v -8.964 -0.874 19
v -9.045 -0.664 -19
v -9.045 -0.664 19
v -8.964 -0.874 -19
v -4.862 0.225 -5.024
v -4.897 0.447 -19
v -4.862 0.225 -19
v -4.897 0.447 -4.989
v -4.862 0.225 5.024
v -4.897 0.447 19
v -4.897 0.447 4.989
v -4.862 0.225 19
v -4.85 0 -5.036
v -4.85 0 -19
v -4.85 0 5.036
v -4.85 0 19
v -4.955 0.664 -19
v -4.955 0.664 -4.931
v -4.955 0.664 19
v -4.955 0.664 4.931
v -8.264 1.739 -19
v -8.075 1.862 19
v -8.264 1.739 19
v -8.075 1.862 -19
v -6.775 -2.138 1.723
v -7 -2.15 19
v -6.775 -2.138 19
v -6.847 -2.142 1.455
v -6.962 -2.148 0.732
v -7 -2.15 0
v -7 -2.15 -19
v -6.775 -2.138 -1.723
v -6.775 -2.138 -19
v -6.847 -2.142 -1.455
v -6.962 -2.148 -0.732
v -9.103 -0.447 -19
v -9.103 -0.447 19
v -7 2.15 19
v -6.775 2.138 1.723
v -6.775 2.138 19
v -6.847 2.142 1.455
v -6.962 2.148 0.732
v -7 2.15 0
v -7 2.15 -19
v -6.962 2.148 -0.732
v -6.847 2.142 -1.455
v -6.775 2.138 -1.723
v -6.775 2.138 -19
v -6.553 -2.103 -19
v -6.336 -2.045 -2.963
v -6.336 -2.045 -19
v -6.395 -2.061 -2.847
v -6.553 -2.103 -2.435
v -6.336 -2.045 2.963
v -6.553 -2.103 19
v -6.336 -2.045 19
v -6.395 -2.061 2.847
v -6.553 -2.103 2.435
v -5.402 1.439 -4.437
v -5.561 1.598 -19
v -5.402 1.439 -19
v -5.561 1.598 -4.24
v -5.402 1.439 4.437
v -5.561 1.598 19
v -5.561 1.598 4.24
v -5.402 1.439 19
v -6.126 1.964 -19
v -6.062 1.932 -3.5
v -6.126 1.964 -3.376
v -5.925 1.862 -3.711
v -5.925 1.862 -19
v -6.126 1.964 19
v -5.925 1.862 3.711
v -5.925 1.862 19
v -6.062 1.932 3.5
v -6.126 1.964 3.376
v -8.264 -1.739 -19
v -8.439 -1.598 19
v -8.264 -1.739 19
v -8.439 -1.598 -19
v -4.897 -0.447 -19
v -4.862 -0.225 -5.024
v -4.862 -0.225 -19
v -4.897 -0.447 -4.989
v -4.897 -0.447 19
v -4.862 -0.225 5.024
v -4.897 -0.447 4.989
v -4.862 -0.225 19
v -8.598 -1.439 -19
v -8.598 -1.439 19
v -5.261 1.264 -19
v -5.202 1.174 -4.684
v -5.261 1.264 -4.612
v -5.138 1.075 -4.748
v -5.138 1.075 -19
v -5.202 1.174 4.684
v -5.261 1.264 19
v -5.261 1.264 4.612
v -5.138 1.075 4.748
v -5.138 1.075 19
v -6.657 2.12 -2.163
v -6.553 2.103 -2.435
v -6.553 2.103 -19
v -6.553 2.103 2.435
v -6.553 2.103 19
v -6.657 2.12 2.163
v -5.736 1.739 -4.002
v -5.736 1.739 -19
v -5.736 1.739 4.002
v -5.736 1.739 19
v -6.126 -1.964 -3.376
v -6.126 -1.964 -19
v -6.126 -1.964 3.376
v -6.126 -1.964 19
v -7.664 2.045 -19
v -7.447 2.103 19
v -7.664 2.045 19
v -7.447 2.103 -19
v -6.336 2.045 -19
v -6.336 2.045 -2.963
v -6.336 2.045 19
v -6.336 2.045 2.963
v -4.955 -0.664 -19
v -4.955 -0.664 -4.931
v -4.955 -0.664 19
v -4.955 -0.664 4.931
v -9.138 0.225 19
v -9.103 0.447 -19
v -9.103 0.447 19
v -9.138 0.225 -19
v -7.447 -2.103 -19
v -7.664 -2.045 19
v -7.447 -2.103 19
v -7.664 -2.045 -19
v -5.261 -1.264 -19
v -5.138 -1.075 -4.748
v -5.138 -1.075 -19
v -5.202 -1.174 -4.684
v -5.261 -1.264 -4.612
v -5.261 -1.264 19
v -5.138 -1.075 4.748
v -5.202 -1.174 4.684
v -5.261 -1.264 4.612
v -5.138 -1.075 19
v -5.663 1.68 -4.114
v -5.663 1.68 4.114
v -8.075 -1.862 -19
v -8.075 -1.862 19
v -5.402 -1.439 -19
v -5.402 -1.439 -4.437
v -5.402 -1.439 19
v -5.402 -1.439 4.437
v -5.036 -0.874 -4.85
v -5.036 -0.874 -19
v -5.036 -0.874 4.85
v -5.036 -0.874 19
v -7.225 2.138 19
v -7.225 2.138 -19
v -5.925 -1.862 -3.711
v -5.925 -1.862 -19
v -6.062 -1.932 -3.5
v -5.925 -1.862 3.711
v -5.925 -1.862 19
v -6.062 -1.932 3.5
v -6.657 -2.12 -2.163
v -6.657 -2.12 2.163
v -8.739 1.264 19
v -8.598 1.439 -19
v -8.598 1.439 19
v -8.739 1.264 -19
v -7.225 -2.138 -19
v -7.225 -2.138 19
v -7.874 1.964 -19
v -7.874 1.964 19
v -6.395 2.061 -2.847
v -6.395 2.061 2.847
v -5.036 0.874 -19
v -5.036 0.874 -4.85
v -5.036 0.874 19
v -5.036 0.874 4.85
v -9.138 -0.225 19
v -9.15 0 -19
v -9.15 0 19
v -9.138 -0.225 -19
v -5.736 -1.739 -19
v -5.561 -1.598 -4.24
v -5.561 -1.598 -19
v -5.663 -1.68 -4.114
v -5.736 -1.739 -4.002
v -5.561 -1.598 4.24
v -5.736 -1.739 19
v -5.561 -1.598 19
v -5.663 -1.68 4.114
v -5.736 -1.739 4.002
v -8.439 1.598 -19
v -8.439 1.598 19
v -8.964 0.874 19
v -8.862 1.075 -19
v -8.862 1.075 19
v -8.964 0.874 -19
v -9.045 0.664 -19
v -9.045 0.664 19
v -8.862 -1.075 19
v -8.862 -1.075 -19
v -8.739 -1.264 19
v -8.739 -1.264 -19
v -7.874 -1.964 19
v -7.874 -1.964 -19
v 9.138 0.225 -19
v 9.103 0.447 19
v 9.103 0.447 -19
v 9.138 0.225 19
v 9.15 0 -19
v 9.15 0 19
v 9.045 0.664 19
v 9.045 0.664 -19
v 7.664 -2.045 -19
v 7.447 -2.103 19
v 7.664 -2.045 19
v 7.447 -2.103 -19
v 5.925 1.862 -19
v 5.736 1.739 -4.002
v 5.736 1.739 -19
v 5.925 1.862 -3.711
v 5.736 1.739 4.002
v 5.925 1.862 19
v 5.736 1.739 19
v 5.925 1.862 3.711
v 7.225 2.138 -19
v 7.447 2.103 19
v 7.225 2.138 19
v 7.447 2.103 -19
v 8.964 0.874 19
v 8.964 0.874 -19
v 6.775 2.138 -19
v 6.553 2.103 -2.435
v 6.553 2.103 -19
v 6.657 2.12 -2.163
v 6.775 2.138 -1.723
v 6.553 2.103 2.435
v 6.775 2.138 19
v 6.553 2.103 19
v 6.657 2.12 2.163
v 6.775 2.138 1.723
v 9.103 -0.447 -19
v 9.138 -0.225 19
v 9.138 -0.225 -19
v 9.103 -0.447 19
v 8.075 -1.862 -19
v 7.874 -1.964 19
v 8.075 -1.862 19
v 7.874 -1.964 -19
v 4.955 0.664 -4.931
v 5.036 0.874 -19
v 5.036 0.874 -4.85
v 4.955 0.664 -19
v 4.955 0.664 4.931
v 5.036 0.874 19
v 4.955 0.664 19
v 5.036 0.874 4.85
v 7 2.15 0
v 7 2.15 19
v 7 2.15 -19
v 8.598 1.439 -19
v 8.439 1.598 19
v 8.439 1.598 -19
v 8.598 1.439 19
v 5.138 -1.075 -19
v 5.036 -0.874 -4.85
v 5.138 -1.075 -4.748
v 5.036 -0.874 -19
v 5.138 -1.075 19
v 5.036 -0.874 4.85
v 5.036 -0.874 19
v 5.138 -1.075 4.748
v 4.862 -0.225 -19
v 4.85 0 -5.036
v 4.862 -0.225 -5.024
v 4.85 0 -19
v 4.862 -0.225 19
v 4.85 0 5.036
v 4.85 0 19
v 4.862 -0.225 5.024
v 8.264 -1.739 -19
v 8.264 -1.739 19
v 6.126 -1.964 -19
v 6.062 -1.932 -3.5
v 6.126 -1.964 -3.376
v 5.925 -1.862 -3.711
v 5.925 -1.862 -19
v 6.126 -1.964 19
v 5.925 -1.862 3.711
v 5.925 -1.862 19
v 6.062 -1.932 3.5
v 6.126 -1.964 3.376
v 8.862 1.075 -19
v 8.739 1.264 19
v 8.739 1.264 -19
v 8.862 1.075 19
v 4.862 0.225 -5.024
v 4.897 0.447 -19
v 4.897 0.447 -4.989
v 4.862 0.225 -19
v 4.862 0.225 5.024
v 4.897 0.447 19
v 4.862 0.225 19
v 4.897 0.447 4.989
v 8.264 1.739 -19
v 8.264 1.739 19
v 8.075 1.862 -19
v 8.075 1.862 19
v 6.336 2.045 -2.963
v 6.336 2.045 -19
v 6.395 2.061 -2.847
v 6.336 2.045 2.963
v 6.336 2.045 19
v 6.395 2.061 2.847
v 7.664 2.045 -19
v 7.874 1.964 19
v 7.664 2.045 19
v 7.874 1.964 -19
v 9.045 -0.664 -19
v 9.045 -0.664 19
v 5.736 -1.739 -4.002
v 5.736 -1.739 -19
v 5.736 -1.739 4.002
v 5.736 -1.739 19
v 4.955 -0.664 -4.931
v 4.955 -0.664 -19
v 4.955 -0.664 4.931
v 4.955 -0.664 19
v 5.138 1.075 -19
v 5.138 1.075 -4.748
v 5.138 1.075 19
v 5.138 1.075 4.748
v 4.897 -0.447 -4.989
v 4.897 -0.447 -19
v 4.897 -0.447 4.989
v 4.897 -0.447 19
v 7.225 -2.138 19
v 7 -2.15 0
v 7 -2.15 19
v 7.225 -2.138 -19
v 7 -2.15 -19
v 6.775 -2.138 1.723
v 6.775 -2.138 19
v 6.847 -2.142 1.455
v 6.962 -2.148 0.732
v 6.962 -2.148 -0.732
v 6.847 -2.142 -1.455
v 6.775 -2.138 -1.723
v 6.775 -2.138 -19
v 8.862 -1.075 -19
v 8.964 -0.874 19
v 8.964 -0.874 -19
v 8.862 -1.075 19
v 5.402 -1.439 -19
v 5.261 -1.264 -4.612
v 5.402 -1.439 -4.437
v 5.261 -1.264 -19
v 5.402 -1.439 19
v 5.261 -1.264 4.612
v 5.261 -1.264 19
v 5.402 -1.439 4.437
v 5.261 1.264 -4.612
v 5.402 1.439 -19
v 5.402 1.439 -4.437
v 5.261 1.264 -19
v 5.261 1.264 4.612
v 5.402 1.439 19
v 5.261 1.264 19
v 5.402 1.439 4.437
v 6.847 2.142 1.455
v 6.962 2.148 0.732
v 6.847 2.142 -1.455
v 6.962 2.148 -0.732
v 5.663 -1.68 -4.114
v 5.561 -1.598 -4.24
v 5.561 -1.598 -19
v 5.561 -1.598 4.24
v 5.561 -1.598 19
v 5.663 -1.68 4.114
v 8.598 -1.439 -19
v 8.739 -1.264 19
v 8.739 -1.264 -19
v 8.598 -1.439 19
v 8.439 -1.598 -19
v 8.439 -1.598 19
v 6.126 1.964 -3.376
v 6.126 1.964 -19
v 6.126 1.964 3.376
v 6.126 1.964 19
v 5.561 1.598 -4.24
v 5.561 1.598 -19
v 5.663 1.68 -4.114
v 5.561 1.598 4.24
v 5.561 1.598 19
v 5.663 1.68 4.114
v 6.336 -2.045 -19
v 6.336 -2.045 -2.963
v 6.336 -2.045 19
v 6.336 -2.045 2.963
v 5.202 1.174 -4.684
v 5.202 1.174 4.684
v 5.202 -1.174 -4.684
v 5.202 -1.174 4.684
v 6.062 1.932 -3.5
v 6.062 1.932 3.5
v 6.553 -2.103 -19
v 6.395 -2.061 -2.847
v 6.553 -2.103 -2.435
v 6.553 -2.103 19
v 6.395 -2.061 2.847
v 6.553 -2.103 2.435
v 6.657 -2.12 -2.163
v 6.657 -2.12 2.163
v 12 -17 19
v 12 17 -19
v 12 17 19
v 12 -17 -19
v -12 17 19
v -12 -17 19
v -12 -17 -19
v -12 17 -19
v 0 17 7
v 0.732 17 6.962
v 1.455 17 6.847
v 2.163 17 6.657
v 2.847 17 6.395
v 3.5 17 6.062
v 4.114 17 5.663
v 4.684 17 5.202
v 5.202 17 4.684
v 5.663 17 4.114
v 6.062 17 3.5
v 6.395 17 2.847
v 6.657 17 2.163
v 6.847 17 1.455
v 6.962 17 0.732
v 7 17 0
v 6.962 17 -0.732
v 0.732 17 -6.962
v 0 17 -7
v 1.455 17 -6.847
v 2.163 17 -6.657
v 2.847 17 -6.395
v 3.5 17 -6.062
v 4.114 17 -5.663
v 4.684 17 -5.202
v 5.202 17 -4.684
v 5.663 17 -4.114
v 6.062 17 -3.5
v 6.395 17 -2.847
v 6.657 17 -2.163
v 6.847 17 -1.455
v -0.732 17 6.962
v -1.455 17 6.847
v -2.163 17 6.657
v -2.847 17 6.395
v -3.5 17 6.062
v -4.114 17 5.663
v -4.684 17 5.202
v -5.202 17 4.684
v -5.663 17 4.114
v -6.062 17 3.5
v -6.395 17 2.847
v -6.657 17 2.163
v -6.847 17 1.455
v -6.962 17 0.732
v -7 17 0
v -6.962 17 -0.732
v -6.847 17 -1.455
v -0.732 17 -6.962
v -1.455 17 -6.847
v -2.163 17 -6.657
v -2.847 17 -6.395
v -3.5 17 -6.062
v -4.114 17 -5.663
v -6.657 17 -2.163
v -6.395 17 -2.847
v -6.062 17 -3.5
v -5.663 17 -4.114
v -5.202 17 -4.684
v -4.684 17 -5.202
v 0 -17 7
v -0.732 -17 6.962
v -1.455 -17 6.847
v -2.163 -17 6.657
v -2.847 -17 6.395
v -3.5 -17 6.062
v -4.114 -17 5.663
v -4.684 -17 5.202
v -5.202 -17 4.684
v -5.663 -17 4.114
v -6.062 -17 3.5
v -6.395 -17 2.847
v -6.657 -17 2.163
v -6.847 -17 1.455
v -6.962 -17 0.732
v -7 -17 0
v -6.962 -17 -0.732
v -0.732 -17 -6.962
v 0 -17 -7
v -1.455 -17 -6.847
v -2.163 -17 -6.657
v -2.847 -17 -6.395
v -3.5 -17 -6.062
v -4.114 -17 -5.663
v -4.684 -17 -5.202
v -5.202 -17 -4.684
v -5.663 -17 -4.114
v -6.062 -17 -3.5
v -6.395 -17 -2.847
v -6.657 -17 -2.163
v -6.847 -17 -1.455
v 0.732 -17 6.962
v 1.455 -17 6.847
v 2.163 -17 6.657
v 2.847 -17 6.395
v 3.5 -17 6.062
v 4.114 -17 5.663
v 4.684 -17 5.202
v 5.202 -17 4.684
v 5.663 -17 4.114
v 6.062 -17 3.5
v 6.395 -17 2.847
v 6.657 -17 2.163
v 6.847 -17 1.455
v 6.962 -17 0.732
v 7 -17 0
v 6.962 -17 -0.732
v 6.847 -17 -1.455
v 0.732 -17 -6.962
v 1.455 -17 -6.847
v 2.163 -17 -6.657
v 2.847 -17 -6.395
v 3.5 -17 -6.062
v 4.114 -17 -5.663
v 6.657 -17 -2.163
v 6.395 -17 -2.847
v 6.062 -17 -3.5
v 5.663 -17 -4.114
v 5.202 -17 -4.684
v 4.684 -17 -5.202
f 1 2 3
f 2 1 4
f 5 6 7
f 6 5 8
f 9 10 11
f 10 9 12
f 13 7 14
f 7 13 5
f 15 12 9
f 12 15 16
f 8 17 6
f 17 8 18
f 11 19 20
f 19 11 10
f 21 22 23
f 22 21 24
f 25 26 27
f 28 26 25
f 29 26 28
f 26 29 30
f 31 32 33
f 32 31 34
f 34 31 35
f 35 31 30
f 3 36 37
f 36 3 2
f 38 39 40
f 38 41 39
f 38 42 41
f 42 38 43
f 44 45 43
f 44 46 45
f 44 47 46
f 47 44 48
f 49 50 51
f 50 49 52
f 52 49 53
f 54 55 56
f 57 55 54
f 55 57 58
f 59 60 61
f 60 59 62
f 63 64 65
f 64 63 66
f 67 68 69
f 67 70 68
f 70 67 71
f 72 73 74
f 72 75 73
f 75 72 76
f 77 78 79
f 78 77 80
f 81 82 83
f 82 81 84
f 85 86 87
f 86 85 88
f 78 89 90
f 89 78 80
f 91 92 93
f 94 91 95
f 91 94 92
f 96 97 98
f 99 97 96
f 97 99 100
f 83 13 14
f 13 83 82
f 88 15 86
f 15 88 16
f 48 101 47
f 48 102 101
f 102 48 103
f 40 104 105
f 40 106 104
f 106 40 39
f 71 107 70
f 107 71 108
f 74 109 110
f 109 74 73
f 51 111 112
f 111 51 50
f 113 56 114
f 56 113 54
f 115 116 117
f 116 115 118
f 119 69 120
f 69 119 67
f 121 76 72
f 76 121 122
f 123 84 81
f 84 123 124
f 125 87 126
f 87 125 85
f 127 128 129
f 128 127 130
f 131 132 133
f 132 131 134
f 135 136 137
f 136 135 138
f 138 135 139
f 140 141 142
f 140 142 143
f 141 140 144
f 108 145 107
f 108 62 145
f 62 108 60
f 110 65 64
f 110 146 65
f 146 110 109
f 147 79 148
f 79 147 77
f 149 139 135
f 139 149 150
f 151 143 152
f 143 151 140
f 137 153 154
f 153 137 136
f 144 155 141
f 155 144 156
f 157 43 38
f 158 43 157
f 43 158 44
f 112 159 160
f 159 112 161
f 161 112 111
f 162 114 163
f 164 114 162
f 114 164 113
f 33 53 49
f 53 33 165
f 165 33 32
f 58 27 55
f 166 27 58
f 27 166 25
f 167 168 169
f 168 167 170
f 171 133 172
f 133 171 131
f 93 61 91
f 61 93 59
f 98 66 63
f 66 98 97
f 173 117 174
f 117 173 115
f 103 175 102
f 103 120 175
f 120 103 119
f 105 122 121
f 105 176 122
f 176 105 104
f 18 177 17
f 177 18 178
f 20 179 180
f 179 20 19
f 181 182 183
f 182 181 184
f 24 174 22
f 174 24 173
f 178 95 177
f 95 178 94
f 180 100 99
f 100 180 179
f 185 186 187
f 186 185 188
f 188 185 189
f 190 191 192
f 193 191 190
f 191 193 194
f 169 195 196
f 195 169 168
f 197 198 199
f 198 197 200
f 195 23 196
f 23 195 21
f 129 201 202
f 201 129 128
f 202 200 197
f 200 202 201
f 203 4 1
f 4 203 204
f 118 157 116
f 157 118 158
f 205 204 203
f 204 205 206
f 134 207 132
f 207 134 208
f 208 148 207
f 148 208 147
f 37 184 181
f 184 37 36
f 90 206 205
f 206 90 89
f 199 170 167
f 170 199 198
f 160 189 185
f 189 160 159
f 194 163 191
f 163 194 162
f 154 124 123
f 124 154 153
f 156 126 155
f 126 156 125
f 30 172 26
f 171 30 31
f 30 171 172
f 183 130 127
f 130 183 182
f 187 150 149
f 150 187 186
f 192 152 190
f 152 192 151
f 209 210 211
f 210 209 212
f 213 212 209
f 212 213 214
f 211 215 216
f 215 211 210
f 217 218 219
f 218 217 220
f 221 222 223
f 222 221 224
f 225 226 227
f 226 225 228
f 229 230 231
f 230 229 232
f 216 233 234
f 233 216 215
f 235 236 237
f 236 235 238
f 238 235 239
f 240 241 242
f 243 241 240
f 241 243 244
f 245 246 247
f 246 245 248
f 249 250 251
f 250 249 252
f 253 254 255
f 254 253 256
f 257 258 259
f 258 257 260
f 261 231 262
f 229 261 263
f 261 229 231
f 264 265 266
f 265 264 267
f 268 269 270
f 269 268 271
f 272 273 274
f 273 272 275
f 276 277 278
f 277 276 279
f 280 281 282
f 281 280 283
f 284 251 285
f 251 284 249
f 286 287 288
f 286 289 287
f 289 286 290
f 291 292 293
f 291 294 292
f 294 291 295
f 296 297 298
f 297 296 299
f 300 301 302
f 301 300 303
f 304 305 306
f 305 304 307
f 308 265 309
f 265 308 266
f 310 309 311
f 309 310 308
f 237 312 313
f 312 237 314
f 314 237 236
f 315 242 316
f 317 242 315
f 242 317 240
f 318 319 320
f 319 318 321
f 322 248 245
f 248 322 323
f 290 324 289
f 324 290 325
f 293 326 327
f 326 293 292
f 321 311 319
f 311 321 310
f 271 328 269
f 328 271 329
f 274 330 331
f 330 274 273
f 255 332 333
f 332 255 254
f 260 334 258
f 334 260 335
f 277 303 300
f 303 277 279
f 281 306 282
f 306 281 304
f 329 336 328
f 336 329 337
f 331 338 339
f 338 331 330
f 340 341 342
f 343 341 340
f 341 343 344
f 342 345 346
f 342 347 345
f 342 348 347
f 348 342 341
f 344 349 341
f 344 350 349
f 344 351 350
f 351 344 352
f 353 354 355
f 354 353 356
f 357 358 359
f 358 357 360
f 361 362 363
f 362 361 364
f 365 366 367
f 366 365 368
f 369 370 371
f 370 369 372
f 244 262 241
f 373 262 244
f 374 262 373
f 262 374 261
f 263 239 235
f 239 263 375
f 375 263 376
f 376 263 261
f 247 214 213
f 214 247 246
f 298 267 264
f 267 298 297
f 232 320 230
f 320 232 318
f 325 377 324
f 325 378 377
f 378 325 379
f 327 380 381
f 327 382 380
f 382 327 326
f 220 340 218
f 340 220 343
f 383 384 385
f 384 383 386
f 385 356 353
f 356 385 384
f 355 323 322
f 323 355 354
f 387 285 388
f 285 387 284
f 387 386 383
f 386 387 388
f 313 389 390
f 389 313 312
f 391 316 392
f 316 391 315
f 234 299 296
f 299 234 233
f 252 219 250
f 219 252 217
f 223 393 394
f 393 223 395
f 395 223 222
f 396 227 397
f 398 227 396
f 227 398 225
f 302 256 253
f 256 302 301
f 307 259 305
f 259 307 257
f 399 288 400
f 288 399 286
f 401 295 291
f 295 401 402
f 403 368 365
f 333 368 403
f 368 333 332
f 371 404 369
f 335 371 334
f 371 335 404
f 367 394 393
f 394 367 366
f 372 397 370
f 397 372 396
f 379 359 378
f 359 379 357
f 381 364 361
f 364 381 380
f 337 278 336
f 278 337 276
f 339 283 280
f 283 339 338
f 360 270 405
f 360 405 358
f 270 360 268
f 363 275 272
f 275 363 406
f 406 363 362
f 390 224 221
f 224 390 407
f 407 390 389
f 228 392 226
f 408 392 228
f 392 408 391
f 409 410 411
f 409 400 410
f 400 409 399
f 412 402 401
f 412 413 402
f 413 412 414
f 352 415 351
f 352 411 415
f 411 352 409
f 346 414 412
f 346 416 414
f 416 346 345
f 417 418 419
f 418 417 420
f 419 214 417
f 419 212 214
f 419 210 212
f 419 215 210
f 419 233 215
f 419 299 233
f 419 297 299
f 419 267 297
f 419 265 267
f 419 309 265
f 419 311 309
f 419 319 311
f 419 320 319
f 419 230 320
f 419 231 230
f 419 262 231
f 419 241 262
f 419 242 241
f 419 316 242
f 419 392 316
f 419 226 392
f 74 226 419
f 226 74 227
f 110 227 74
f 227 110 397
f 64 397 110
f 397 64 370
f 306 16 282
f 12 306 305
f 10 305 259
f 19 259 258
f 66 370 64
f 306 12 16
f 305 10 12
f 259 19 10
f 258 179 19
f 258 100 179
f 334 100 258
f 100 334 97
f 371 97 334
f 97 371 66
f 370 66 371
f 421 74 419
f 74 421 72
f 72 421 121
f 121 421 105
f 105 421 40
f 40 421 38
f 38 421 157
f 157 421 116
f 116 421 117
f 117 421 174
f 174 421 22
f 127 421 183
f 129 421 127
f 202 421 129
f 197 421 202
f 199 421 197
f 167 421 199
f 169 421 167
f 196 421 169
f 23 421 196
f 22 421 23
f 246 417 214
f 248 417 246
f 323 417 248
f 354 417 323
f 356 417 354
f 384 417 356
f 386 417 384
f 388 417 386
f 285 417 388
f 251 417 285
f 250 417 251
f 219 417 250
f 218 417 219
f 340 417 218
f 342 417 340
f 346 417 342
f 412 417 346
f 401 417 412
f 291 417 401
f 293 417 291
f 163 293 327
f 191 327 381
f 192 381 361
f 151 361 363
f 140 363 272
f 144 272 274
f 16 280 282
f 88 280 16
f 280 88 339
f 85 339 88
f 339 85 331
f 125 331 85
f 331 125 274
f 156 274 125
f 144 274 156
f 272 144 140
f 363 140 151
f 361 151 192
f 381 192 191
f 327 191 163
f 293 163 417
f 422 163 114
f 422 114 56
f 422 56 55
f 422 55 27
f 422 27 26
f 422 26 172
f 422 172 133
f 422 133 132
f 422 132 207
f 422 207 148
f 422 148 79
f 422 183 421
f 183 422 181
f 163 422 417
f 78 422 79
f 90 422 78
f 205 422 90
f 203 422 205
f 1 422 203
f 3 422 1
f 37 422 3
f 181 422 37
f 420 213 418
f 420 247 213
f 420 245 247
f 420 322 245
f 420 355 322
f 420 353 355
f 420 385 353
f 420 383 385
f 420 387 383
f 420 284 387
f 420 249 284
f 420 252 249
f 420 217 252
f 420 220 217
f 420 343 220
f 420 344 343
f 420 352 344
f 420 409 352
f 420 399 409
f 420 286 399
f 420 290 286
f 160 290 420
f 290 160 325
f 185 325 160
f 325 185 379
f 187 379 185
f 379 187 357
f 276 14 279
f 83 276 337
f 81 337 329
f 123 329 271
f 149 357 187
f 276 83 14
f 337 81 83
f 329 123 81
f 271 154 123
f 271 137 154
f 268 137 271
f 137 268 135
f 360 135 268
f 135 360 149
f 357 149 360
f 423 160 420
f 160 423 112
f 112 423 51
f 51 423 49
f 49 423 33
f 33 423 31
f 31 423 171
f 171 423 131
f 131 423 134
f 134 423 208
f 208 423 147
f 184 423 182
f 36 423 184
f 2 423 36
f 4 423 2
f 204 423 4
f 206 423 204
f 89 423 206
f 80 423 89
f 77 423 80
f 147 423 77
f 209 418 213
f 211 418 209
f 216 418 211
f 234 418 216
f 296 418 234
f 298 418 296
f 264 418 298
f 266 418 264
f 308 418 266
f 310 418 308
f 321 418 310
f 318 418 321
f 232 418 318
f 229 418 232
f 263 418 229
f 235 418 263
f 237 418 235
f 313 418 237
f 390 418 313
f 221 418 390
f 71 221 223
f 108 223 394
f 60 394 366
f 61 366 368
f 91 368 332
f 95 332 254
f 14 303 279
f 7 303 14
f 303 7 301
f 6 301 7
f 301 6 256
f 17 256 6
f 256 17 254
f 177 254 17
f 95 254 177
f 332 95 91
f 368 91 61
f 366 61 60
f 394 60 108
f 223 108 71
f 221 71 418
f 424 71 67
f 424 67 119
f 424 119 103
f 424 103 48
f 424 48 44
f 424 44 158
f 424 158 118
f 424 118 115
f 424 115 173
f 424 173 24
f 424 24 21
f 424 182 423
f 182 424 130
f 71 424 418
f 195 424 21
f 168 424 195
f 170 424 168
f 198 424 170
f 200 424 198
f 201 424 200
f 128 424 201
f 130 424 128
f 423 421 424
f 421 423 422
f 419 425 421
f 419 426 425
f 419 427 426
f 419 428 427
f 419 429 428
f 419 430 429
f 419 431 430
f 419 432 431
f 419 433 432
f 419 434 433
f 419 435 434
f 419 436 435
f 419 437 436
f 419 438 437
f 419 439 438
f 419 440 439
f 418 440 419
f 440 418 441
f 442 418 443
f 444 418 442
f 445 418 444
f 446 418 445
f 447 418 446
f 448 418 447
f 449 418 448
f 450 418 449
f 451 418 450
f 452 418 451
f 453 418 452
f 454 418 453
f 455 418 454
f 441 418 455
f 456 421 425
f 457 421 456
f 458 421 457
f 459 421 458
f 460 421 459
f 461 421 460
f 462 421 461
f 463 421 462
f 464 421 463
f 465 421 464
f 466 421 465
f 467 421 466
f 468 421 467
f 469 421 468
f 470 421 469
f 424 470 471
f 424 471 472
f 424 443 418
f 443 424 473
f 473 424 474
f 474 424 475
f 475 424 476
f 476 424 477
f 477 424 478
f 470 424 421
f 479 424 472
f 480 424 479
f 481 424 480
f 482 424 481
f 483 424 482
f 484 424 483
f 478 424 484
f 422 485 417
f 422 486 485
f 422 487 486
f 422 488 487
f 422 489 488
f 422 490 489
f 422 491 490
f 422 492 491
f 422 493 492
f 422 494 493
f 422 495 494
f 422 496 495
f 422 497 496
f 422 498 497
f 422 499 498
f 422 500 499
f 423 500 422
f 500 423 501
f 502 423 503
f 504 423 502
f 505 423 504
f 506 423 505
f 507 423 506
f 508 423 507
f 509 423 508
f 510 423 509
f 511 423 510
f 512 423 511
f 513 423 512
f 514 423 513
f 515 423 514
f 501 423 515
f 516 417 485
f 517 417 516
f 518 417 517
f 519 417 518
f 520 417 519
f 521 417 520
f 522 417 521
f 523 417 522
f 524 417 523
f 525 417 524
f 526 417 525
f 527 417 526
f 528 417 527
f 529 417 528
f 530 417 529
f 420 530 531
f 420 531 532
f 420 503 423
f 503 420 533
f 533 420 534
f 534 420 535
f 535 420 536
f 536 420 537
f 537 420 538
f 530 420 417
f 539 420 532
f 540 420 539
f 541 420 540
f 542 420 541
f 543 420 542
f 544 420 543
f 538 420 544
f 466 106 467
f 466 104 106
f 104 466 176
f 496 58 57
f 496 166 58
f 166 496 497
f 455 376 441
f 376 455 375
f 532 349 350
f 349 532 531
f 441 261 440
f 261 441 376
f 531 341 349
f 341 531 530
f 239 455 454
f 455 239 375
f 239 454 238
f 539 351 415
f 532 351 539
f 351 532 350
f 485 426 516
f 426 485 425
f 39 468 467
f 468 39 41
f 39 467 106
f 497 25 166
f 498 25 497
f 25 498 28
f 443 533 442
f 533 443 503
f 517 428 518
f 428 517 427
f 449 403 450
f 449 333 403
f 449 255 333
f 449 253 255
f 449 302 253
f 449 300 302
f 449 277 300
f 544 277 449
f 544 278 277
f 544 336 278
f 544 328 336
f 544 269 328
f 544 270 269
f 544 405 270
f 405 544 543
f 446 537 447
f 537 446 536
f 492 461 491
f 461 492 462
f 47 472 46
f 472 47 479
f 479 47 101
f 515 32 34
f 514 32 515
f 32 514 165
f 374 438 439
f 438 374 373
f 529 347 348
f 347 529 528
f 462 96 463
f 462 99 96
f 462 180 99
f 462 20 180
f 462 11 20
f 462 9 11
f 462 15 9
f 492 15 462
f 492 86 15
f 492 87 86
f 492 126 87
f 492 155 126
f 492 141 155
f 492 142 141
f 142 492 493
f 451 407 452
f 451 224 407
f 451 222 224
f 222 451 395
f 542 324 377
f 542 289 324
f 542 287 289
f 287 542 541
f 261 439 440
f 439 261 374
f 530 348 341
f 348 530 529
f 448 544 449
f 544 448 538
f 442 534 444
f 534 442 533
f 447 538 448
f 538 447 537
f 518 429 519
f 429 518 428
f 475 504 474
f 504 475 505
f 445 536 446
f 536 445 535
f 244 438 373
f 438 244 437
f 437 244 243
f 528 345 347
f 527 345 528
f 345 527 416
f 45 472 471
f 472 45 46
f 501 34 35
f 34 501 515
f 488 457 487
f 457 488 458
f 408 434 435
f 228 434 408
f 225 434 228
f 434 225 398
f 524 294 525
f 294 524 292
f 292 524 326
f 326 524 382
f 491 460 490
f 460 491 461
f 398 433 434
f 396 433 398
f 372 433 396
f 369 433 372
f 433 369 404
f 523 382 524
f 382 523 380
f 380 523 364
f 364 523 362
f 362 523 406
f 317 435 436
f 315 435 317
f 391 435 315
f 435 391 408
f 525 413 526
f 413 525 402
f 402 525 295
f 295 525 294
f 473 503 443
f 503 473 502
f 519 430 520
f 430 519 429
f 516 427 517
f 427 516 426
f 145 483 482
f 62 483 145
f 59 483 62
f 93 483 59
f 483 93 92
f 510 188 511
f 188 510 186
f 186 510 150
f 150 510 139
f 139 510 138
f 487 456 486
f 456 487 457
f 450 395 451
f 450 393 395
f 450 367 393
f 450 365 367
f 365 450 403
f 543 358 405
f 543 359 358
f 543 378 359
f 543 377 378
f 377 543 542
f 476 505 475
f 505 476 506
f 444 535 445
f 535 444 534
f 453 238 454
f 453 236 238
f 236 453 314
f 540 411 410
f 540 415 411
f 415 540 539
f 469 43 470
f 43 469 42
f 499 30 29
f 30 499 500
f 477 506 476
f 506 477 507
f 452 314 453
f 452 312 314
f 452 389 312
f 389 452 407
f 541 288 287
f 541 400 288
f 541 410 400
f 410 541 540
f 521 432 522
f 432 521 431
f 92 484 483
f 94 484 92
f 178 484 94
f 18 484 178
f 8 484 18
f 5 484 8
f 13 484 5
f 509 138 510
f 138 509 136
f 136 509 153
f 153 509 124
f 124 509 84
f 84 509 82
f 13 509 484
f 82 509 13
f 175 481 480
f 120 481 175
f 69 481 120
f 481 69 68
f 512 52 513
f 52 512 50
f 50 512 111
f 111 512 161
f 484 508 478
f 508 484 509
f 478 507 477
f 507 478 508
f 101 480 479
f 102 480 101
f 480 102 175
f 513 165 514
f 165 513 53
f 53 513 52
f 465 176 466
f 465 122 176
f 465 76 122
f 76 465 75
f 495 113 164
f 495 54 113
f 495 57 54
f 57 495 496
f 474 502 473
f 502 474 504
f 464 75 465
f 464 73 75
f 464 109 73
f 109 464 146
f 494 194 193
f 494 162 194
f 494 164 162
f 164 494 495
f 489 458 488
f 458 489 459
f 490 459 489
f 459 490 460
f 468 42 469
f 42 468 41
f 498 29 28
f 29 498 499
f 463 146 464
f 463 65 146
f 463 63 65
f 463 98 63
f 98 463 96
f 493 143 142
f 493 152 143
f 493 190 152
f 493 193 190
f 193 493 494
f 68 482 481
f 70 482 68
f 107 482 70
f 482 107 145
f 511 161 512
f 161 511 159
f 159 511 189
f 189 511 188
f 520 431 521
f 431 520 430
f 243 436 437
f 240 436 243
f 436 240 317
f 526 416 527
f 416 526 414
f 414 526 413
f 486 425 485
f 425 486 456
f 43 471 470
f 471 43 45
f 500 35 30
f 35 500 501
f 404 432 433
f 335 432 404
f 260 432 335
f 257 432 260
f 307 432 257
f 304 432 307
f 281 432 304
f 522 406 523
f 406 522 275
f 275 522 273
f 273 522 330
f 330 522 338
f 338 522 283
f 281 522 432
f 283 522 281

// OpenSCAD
// Linear rail stop block.
$fn = 60;
eps = 0.02;
width = 34;
height = 38;
bore_d = 14;
length = 24;
difference() {
    cube([length,width,height],center=true);
    translate([0,-width/2-eps,0]) rotate([-90,0,0]) cylinder(d=bore_d,h=width+2*eps);
    for(x=[-7,7]) translate([x,0,-height/2-eps]) cylinder(d=4.3,h=height+2*eps);
}
